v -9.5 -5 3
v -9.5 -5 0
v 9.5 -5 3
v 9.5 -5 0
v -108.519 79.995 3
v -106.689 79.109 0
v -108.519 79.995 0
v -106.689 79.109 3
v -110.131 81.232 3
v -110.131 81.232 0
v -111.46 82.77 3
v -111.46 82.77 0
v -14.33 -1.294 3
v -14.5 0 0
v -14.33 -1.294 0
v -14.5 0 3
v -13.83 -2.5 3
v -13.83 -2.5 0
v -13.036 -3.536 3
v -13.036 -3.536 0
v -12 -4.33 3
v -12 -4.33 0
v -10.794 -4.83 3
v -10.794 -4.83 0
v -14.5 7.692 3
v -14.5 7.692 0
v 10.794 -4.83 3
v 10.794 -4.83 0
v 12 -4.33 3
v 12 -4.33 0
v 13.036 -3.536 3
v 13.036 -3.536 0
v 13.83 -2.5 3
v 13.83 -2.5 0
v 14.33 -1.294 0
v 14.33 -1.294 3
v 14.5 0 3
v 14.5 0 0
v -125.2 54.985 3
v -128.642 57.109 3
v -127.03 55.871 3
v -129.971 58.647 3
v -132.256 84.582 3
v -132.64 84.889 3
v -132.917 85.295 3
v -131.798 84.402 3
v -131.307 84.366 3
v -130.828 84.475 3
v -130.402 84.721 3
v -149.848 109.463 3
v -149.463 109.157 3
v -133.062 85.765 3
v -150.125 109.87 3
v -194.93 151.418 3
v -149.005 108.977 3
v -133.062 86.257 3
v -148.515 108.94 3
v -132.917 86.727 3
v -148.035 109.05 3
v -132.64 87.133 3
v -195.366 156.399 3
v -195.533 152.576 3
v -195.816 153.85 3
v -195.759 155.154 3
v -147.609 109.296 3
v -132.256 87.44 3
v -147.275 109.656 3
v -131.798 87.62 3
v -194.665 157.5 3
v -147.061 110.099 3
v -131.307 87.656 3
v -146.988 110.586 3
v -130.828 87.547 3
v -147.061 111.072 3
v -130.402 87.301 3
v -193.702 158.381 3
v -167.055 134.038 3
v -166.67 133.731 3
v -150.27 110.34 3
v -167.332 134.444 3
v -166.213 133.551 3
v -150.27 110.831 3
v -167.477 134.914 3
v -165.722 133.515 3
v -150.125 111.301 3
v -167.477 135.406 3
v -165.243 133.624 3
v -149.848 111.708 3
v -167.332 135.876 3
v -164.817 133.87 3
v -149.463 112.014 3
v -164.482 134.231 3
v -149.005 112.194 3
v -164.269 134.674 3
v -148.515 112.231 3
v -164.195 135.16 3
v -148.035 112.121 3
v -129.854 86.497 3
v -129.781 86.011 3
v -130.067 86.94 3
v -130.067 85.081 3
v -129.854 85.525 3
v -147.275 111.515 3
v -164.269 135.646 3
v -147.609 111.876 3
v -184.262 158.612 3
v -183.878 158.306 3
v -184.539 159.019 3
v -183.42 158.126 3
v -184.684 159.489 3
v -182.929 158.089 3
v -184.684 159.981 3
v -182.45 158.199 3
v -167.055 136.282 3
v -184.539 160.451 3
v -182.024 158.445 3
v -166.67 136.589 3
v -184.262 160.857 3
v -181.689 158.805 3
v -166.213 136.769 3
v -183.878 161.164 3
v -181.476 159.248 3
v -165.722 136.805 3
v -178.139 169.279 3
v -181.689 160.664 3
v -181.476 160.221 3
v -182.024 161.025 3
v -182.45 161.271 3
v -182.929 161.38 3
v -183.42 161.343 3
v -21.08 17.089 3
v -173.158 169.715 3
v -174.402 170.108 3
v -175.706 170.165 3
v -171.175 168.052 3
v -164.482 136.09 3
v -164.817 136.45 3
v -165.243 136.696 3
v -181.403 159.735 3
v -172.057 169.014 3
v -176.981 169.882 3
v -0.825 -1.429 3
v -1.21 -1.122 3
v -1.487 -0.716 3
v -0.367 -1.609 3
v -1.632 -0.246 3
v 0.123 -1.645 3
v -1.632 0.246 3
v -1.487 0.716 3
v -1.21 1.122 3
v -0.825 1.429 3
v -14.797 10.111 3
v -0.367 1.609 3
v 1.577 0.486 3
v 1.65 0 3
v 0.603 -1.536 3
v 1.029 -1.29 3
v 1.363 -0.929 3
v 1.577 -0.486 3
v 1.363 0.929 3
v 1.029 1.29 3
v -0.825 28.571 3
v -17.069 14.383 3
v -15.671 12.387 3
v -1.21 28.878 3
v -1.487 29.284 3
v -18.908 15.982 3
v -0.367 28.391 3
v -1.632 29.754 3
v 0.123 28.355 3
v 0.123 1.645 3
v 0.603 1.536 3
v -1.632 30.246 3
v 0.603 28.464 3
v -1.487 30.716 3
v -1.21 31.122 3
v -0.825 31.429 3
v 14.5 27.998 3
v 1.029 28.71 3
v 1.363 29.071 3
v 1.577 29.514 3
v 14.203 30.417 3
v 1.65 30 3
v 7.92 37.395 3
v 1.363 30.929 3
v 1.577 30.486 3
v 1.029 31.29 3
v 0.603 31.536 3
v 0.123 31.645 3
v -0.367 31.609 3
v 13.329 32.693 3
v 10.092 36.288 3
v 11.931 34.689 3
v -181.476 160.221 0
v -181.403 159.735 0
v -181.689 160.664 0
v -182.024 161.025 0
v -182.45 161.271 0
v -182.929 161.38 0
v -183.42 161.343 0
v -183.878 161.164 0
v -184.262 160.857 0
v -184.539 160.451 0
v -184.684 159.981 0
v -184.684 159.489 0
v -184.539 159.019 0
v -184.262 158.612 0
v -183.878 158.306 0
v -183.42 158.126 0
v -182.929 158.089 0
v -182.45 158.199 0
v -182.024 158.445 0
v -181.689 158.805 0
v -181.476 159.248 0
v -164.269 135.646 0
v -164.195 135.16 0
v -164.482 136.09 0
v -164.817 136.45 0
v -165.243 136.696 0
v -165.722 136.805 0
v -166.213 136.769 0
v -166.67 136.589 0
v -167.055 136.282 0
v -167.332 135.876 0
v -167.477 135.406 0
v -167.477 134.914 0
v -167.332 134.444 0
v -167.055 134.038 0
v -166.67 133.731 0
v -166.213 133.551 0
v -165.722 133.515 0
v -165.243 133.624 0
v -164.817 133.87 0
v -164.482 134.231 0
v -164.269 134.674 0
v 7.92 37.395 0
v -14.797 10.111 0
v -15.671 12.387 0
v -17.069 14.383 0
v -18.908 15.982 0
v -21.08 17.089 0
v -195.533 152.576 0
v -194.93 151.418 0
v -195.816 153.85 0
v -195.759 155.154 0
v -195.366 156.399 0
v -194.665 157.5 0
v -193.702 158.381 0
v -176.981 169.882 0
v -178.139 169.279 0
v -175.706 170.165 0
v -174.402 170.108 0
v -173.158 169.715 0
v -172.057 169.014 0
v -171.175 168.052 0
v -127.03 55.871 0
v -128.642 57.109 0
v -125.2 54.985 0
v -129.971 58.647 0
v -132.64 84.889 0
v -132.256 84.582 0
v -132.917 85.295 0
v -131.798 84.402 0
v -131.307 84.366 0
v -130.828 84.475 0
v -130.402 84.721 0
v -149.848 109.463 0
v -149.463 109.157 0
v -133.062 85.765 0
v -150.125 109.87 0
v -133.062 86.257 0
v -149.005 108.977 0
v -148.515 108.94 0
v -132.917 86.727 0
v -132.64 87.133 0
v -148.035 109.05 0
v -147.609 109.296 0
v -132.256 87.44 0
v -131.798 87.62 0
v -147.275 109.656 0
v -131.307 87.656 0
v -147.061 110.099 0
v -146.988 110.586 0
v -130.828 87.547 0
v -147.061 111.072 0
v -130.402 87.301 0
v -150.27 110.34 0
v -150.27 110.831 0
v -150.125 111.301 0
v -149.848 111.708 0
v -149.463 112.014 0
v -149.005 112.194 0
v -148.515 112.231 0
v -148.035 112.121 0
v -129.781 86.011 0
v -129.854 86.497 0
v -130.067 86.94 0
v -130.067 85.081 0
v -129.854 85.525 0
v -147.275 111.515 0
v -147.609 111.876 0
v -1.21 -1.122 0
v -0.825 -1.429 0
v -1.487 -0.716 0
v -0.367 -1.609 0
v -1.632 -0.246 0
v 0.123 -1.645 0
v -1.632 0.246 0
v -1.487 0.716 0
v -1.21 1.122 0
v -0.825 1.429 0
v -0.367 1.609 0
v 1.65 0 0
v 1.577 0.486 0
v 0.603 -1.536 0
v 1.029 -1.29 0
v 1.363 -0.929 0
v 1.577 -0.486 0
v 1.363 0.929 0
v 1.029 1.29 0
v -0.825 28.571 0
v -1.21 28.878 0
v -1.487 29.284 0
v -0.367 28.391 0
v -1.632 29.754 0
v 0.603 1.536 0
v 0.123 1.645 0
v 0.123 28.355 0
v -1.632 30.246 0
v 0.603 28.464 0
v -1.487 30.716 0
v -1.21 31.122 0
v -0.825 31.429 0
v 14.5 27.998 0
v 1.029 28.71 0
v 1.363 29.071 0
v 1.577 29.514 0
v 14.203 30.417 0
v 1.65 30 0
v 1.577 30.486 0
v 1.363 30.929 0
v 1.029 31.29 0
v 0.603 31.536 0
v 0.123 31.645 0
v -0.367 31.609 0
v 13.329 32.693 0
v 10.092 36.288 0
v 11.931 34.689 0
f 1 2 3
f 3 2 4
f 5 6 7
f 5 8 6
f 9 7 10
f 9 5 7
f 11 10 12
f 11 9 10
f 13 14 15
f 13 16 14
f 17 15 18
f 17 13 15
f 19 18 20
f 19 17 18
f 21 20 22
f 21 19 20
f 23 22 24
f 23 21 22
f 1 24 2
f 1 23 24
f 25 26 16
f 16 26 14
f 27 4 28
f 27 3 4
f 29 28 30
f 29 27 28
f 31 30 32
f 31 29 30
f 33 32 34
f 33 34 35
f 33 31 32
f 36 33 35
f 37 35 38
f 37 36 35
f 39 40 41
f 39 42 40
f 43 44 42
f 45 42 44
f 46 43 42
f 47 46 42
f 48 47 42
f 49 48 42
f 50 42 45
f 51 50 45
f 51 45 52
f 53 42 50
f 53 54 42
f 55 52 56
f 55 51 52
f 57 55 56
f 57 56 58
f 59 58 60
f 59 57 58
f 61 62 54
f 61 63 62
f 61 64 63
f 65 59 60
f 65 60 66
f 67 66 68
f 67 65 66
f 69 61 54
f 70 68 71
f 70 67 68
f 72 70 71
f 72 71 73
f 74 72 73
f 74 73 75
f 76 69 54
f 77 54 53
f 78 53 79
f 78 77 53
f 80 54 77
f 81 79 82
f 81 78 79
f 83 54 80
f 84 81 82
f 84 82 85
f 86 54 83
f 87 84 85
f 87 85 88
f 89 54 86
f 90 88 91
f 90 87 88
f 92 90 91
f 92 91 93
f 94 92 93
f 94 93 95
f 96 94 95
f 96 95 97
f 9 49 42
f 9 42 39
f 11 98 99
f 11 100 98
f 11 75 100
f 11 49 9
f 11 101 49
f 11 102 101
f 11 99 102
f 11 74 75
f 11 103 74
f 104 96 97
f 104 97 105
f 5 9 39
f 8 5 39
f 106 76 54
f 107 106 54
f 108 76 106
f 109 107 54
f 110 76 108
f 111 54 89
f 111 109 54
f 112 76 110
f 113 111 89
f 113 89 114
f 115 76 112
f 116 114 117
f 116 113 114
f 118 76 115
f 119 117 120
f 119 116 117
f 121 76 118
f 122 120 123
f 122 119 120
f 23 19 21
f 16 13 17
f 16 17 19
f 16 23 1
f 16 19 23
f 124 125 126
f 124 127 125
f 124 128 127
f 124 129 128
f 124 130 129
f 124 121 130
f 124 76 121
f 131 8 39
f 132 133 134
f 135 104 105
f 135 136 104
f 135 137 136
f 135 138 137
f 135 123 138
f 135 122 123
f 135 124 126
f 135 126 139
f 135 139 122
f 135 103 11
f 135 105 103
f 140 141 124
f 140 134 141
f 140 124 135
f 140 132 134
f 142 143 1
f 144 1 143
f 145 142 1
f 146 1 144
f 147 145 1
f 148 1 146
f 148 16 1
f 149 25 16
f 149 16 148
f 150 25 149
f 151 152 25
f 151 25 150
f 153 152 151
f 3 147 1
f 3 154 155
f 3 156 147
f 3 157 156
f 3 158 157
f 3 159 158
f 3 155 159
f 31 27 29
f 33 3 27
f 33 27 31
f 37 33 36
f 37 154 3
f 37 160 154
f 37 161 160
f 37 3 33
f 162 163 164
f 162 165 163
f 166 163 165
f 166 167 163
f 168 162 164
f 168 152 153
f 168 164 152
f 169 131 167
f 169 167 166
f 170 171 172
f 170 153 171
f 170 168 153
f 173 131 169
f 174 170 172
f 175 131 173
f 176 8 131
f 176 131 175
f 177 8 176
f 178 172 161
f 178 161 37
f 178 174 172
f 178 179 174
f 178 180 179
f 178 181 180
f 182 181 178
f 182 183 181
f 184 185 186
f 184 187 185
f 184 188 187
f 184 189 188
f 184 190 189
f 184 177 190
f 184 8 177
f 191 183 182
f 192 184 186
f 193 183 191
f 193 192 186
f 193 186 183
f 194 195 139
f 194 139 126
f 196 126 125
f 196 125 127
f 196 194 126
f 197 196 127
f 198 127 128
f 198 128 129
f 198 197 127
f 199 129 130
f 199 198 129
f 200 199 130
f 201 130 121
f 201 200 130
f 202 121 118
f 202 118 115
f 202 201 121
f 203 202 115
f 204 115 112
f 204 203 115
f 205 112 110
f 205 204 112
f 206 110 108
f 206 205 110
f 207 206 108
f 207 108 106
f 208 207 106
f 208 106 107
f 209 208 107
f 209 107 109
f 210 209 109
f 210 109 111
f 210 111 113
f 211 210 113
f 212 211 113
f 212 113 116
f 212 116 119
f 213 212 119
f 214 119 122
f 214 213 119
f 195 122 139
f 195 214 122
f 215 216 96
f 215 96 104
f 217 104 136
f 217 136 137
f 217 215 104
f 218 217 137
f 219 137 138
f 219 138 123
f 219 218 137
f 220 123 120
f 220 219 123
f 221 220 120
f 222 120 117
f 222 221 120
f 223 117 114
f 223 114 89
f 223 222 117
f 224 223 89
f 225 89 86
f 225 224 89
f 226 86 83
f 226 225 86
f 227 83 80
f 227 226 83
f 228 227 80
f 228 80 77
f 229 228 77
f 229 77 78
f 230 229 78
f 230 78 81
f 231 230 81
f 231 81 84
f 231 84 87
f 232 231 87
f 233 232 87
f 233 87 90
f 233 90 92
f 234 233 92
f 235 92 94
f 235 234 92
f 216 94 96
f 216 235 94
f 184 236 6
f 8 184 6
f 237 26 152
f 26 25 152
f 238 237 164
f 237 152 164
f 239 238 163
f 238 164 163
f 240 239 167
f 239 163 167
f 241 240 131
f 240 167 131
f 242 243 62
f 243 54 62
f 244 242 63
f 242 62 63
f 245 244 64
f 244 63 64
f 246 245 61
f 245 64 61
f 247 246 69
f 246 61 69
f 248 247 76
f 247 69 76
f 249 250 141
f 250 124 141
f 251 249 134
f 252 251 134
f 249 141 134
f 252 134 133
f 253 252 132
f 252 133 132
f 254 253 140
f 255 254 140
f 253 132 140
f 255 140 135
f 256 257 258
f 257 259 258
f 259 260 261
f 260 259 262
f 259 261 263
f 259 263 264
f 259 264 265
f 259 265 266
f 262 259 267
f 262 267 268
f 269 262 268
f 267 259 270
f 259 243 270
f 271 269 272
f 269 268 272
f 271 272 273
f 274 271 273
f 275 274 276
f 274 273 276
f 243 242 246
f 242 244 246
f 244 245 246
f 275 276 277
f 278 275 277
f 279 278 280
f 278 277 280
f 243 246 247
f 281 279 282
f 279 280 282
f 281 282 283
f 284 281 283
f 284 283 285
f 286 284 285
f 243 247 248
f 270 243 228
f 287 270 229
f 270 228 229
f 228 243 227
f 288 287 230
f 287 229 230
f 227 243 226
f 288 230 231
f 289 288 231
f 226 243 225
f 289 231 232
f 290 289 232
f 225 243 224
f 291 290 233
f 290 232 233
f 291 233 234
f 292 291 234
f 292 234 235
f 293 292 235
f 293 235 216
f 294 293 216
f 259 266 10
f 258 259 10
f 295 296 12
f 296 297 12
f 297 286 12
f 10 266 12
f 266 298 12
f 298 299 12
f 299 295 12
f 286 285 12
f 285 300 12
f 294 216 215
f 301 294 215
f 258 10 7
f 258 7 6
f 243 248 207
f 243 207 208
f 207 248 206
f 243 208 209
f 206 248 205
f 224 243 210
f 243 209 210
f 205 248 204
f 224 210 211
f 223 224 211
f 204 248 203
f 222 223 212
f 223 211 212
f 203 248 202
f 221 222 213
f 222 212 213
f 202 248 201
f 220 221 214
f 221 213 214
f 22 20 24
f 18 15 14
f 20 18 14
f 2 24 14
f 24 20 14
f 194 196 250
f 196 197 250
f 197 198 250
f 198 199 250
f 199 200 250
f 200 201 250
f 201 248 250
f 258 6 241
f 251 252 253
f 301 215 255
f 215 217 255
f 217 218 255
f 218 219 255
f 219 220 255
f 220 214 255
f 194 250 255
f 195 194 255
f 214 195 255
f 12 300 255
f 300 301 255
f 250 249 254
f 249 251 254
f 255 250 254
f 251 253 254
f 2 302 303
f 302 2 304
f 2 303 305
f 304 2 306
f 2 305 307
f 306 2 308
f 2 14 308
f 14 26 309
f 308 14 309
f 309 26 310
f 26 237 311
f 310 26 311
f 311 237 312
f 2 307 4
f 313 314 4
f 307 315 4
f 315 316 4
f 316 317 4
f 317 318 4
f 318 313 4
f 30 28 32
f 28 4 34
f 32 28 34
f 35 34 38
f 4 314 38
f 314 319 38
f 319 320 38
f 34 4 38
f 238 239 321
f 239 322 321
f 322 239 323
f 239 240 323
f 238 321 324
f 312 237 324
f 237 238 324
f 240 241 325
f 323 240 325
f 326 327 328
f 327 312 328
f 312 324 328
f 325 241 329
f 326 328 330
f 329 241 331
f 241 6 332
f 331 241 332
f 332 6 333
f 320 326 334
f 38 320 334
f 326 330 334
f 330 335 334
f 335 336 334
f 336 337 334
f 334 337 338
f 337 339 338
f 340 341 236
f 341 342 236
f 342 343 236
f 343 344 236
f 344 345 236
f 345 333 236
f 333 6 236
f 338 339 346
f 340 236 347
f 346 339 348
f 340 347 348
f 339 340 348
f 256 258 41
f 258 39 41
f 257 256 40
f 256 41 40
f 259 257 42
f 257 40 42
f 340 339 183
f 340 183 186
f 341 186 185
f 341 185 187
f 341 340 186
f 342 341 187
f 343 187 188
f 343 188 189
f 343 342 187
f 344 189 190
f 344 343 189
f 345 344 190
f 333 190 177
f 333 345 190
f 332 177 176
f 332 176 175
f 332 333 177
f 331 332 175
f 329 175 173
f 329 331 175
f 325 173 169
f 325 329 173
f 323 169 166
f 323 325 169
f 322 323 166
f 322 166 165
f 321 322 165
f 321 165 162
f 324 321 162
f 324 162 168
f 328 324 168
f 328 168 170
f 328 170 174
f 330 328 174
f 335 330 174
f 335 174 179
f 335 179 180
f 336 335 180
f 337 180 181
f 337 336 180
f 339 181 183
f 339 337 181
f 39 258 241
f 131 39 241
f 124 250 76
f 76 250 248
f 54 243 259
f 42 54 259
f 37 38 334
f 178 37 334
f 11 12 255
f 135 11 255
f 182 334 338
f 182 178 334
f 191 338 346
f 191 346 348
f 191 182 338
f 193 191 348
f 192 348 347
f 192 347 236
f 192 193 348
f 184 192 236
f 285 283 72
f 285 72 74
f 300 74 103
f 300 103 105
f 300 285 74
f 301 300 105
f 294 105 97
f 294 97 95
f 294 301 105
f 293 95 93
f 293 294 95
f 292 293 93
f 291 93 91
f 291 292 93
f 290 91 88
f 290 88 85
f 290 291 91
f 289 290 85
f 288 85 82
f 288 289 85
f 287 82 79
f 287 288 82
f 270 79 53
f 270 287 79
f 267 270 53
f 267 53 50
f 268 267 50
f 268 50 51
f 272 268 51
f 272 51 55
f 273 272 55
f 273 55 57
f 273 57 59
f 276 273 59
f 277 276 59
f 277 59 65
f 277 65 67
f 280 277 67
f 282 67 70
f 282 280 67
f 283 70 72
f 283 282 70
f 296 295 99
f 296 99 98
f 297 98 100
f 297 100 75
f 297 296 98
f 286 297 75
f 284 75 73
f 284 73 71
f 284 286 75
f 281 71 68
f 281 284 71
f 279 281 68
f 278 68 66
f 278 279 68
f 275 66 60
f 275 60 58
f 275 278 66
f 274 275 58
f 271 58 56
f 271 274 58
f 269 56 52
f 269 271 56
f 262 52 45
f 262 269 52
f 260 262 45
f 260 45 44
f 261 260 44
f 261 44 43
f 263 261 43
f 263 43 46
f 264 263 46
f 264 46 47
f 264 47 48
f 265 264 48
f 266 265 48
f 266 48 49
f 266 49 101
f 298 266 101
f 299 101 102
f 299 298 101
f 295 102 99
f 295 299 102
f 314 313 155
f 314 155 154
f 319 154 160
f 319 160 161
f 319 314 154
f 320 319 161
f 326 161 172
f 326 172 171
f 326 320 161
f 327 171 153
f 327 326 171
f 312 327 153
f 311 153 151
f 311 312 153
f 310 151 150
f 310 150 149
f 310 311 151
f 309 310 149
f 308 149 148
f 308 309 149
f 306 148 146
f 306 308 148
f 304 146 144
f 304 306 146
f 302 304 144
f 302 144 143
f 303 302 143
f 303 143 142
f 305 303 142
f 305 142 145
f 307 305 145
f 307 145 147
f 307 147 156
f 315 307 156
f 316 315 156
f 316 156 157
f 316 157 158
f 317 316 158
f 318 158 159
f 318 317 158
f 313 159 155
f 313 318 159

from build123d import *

# Parameters (mm, degrees)
SKETCH_1_R      = 1.65
EXTRUDE_1_DEPTH = 3
FILLET_1_R      = 10
FILLET_2_R      = 5


with BuildPart() as part:
    # 草图1 → 凸台-拉伸1 (new body)
    with BuildSketch(Plane.XY):
        Polygon((-14.5, -5), (14.5, -5), (14.5, 35), (-109.652000503, 80.187632708), (-174.042829775, 172.147267185), (-197.798239059, 155.513550531), (-128.162819072, 56.063864277), (-14.5, 14.693981392), align=None)
        Circle(SKETCH_1_R, mode=Mode.SUBTRACT)
        with Locations((0, 30)):
            Circle(SKETCH_1_R, mode=Mode.SUBTRACT)
        with Locations((-183.052652235, 159.734648636)):
            Circle(SKETCH_1_R, mode=Mode.SUBTRACT)
        with Locations((-165.845359145, 135.160087308)):
            Circle(SKETCH_1_R, mode=Mode.SUBTRACT)
        with Locations((-148.638066054, 110.585525979)):
            Circle(SKETCH_1_R, mode=Mode.SUBTRACT)
        with Locations((-131.430772964, 86.01096465)):
            Circle(SKETCH_1_R, mode=Mode.SUBTRACT)
    extrude(amount=EXTRUDE_1_DEPTH)

    # 圆角1
    fillet_1_edges = [part.edges().sort_by_distance(p)[0] for p in [
        (-14.5, 14.693981392, 1.5),
        (-128.162819072, 56.063864277, 1.5),
        (-109.652000503, 80.187632708, 1.5),
        (14.5, 35, 1.5),
    ]]
    fillet(fillet_1_edges, radius=FILLET_1_R)

    # 圆角2
    fillet_2_edges = [part.edges().sort_by_distance(p)[0] for p in [
        (-197.798239059, 155.513550531, 1.5),
        (-174.042829775, 172.147267185, 1.5),
        (14.5, -5, 1.5),
        (-14.5, -5, 1.5),
    ]]
    fillet(fillet_2_edges, radius=FILLET_2_R)


solid = part.part
